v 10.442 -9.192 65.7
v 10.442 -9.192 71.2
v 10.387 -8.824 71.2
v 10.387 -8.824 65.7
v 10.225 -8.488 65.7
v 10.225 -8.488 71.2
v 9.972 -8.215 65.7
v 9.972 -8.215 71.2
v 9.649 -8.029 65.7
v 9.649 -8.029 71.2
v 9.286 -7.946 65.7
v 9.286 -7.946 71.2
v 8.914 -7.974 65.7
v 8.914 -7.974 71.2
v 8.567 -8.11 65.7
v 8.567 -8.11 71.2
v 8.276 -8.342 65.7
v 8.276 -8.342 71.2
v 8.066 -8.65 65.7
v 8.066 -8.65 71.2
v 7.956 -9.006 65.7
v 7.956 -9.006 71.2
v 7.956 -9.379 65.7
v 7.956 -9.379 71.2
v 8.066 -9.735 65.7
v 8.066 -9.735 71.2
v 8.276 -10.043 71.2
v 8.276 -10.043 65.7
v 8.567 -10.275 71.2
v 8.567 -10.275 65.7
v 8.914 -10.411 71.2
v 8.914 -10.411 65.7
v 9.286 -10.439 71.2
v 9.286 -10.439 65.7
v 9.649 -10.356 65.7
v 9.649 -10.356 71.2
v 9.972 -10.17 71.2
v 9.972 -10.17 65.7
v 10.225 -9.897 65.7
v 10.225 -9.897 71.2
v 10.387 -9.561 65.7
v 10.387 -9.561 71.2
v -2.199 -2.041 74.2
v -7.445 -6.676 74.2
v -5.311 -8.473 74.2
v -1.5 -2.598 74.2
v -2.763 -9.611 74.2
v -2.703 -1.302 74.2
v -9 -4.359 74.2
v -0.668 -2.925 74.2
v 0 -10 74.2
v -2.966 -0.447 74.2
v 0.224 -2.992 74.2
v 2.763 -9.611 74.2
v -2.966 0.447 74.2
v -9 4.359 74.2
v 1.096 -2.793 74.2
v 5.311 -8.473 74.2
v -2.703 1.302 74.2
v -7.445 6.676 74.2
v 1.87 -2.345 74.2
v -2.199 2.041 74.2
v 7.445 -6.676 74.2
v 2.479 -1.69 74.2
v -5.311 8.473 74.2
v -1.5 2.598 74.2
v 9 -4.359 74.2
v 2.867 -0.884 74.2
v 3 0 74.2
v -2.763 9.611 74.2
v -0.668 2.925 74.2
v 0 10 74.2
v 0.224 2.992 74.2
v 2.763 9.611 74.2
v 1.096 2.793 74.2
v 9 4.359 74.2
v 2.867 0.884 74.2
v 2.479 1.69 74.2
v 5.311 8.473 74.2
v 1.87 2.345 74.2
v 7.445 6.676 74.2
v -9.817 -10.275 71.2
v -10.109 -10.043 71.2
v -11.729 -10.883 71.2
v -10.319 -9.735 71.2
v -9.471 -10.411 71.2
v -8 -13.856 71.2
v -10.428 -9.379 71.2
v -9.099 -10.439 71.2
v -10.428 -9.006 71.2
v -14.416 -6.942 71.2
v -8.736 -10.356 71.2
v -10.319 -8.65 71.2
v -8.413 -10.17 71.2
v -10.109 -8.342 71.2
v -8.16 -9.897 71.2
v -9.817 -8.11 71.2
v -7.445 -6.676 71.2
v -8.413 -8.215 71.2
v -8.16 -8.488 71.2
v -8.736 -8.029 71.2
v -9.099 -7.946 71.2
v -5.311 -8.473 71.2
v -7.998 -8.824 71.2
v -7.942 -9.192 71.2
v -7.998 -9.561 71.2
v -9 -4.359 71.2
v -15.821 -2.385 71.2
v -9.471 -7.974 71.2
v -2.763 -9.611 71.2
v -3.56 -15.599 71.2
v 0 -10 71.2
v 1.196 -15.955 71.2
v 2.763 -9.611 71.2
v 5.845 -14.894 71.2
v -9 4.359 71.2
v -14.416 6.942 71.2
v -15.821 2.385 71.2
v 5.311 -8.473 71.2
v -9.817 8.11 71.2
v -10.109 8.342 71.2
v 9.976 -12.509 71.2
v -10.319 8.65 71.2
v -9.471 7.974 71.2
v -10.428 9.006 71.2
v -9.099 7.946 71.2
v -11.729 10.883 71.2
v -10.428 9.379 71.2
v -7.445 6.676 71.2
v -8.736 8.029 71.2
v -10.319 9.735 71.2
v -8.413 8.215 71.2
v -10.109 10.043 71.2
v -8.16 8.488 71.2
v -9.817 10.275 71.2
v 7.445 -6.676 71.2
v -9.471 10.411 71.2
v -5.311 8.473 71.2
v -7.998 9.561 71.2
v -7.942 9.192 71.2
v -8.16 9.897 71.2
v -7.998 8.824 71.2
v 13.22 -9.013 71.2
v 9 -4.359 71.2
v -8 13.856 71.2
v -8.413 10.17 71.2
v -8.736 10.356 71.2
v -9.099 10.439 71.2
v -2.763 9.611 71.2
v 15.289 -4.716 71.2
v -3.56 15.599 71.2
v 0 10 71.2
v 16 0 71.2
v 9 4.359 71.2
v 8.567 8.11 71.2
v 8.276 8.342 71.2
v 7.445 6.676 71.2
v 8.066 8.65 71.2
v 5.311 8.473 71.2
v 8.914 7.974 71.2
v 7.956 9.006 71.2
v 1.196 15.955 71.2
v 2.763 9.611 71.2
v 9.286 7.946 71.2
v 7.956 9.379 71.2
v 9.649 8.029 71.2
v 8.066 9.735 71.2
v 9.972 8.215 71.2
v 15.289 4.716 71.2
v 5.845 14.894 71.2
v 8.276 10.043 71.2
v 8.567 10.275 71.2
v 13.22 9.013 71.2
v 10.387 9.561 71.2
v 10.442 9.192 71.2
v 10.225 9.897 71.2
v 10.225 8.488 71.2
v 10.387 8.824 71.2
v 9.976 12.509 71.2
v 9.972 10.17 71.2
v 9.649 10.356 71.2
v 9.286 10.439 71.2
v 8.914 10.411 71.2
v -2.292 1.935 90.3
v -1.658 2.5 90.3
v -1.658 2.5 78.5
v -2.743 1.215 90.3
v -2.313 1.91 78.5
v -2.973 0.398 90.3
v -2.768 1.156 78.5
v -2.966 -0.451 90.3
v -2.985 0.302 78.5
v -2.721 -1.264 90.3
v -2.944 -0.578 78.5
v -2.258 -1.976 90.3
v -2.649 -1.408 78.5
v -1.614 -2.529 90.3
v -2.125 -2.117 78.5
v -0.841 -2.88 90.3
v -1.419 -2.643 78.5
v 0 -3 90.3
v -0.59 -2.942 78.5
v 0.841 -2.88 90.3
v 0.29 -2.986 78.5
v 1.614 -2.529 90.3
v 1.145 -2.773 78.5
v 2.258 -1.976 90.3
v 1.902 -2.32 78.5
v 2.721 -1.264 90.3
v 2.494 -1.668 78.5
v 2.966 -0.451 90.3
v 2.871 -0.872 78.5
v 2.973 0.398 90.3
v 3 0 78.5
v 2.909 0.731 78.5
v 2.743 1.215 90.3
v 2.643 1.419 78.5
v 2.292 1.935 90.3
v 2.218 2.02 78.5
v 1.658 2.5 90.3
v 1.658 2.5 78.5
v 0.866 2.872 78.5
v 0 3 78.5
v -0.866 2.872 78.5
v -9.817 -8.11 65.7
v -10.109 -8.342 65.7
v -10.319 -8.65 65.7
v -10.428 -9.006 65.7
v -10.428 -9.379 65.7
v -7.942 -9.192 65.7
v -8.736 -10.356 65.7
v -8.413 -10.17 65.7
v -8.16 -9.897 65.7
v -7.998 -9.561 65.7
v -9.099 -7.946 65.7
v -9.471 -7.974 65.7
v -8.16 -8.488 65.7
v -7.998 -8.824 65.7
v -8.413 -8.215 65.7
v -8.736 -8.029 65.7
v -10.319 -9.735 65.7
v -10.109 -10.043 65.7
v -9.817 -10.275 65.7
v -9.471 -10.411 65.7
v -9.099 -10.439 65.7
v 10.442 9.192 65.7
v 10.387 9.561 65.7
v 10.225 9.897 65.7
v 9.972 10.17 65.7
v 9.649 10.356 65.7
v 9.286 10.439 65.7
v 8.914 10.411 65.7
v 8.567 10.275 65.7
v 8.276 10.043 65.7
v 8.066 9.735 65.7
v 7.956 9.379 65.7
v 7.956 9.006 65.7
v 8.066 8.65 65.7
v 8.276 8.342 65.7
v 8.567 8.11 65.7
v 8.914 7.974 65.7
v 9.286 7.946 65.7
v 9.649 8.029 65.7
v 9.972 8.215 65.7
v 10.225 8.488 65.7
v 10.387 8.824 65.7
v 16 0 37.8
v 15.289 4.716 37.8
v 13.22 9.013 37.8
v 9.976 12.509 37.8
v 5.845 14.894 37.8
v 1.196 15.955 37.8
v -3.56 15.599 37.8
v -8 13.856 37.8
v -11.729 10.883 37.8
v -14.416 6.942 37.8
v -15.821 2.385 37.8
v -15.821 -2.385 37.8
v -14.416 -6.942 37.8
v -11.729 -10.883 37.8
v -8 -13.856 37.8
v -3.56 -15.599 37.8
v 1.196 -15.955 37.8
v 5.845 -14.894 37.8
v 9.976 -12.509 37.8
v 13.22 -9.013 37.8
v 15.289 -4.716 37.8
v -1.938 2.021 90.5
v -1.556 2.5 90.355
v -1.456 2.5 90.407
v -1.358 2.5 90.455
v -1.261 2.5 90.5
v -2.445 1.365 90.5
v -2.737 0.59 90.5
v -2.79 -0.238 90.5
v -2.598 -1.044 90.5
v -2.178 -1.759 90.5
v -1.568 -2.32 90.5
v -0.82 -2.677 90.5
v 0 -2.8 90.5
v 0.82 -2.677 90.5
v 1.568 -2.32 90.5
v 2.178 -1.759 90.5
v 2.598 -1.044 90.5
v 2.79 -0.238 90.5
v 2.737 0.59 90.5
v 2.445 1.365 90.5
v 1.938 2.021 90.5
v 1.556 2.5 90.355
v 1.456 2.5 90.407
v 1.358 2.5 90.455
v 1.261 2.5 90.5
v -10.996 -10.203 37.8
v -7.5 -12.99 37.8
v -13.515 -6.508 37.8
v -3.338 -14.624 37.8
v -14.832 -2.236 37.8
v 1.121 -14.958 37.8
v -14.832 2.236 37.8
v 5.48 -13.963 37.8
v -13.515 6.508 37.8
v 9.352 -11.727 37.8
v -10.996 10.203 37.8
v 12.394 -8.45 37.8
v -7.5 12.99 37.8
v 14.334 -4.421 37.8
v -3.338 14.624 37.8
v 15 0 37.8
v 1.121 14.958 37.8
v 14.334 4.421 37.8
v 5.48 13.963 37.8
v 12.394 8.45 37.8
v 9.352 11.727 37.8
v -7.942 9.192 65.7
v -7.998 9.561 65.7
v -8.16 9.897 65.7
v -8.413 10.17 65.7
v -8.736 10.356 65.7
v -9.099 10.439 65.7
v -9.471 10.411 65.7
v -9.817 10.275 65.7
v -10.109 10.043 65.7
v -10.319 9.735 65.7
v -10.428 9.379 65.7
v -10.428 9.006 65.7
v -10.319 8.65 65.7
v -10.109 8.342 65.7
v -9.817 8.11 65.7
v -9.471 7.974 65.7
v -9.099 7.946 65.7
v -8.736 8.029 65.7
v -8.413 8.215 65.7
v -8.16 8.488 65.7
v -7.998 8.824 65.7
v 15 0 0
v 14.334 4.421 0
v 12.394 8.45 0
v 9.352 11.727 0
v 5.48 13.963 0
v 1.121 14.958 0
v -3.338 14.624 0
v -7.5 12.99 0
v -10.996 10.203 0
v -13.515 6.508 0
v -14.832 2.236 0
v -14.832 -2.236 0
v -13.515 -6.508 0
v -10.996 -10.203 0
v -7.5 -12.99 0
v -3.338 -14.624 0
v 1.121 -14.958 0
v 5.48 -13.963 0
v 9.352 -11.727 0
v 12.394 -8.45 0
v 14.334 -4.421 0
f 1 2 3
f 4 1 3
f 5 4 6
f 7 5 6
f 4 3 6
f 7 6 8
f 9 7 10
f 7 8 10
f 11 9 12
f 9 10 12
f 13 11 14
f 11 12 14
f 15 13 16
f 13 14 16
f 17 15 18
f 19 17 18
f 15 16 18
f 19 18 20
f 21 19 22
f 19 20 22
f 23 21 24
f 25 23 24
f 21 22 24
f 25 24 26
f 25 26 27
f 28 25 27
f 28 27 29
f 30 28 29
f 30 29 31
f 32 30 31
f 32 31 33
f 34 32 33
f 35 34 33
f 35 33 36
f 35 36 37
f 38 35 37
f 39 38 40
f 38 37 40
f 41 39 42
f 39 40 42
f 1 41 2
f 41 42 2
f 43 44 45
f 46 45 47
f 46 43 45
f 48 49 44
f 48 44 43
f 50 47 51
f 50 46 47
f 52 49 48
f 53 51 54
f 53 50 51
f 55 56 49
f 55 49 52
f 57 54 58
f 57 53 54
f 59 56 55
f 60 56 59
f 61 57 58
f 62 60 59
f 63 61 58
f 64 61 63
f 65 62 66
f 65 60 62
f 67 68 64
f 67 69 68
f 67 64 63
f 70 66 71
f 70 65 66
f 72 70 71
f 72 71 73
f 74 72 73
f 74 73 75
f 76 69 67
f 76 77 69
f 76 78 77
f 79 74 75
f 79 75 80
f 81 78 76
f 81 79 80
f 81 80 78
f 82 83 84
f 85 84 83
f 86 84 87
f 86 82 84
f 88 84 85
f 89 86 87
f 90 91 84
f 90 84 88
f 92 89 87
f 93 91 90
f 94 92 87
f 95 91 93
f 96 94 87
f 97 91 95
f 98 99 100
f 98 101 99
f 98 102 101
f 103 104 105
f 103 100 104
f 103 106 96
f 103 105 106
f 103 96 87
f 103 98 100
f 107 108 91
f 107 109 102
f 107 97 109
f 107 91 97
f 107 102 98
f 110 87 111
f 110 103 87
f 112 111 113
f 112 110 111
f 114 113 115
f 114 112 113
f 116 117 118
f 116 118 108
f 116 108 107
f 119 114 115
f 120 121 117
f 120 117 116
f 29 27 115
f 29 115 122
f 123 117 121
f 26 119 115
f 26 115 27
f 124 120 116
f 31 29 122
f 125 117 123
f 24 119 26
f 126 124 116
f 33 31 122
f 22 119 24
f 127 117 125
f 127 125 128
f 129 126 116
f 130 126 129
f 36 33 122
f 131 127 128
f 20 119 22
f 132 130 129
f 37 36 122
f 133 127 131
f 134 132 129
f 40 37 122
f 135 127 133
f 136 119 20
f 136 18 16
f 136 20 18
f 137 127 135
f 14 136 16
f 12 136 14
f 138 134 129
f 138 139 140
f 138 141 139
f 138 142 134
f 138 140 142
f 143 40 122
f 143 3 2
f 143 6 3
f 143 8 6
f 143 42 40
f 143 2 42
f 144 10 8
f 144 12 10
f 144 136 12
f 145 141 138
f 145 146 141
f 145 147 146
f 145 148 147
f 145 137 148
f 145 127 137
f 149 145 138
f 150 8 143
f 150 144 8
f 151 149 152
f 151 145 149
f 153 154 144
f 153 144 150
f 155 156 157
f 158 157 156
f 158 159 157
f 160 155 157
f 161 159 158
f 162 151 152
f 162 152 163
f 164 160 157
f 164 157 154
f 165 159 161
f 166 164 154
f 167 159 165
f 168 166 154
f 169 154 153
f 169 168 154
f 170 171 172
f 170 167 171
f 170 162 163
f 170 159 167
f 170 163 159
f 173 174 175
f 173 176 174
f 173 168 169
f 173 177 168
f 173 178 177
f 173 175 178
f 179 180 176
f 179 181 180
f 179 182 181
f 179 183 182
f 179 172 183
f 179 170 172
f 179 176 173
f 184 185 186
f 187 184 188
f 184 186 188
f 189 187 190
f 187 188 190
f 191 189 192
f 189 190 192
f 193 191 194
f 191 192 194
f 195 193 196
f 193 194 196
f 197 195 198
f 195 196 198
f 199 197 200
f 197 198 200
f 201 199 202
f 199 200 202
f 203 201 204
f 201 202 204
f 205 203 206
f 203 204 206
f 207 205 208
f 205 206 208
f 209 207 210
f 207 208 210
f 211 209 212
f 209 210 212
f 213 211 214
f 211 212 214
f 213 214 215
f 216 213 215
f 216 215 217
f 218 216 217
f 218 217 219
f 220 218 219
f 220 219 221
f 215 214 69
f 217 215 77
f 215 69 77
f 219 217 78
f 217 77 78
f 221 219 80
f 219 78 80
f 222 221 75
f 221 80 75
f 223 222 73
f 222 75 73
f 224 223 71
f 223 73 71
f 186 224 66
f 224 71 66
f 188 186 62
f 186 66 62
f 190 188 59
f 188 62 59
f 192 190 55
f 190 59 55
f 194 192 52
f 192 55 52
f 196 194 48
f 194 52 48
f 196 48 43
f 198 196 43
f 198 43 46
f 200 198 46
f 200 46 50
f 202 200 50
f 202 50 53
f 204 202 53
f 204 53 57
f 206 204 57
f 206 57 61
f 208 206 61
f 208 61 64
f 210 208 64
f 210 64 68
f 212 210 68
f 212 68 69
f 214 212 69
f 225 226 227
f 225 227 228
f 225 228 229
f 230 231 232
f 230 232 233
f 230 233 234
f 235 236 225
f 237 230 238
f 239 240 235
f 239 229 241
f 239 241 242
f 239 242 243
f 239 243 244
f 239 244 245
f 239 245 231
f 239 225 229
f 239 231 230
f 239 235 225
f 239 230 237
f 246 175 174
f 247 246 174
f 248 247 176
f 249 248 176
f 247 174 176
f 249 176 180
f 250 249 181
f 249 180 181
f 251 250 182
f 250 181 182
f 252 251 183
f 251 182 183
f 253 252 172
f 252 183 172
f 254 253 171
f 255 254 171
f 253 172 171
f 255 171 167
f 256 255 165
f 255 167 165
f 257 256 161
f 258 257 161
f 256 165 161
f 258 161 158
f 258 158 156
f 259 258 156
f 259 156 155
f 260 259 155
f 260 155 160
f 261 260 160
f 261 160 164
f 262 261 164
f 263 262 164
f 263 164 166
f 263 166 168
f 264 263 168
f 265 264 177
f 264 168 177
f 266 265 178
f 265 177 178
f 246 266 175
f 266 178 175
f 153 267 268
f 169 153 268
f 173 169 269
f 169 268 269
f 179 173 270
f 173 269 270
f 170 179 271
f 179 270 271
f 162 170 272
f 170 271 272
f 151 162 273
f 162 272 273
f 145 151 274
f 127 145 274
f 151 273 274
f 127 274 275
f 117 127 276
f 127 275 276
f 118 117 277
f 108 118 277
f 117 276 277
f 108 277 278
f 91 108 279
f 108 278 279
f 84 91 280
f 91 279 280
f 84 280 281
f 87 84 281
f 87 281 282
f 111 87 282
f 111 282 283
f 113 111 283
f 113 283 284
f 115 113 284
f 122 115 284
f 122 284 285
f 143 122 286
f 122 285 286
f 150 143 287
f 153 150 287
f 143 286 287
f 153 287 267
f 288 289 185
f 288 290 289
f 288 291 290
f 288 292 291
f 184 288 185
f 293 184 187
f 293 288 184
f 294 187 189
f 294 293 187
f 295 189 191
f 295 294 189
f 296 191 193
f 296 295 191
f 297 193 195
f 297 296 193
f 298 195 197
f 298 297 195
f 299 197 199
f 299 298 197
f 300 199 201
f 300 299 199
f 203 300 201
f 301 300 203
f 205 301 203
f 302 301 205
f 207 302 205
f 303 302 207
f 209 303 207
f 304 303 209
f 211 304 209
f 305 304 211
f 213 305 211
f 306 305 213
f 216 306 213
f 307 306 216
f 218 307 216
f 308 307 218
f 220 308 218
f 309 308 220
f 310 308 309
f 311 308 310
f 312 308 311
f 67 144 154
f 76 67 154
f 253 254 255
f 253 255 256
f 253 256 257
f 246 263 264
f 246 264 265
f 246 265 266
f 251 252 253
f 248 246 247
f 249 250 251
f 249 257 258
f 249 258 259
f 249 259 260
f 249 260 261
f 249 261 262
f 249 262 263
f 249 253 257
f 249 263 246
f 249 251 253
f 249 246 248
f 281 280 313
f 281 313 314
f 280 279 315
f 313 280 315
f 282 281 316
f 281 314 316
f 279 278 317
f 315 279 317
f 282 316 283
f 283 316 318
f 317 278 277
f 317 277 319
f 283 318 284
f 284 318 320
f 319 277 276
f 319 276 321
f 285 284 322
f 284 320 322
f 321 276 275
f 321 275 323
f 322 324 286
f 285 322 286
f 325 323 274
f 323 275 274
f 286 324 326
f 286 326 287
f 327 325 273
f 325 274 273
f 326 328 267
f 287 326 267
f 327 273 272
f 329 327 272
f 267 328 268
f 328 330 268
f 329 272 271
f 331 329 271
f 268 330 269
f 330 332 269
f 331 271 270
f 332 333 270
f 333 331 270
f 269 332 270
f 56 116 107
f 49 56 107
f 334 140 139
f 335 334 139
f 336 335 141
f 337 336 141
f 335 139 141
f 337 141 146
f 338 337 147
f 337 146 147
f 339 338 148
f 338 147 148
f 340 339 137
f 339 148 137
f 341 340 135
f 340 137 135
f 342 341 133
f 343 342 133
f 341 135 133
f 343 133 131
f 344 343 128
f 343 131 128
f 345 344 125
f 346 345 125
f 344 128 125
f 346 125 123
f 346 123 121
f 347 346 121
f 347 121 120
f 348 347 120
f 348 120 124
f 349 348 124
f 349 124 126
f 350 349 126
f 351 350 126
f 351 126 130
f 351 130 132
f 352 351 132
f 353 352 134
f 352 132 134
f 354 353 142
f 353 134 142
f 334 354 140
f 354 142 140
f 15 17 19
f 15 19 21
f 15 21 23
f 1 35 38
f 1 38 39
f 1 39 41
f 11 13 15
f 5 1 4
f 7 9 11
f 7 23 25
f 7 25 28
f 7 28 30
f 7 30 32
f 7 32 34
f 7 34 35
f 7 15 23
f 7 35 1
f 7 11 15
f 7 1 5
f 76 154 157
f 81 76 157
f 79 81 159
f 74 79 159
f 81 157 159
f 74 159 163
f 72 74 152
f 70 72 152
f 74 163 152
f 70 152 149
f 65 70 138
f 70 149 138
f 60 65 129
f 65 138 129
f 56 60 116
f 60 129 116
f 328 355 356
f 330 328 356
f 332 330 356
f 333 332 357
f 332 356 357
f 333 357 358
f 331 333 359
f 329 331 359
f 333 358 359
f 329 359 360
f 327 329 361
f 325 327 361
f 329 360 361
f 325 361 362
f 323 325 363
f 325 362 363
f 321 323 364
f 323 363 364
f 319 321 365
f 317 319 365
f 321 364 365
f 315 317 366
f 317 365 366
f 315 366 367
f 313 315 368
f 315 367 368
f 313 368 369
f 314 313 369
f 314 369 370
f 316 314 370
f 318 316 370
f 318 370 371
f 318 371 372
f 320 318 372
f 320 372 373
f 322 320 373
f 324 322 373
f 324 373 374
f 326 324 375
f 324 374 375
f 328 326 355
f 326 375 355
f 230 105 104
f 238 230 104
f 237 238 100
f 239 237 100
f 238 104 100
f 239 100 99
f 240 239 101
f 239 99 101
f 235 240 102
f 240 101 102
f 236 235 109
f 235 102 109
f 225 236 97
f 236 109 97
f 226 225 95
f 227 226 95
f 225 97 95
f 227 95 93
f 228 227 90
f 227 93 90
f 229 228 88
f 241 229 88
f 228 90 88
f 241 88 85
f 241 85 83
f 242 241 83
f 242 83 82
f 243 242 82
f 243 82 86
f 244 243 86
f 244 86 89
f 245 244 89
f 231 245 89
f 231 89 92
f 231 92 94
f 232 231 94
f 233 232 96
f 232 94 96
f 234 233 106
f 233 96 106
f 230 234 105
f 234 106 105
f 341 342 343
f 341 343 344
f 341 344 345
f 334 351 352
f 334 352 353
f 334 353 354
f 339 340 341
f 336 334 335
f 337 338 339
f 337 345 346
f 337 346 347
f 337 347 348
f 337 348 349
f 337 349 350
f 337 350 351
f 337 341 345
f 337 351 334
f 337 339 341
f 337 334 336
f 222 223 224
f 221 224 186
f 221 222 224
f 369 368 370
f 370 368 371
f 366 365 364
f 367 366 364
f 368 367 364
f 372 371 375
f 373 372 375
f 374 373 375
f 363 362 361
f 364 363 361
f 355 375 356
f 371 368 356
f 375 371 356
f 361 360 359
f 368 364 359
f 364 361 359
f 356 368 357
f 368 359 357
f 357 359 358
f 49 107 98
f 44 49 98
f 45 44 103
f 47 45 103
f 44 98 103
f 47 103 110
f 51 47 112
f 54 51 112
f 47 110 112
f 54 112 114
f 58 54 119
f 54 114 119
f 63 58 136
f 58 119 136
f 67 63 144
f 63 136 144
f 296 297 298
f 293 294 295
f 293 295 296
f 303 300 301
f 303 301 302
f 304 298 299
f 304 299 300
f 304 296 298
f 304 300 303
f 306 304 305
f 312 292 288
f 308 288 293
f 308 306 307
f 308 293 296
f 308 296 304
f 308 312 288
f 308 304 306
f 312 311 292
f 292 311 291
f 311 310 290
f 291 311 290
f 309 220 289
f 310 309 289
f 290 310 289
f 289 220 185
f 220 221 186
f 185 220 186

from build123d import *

# Parameters (mm, degrees)
F0_R      = 15
F1_DEPTH  = 37.8
F2_R      = 16
F3_DEPTH  = 33.4
F5_DEPTH  = 3
F6_R      = 3
F7_DEPTH  = 4.3
F9_DEPTH  = 12
F10_SIZE  = 0.2
F11_R     = 1.25
F12_DEPTH = 5.5


with BuildPart() as f1:
    # F0 (on Top) → F1 (new body)
    with BuildSketch(Plane.XY):
        Circle(F0_R)
    extrude(amount=F1_DEPTH)

    # F2 (on face) → F3 (join)
    with BuildSketch(Plane.XY.offset(37.8)):
        Circle(F2_R)
    extrude(amount=F3_DEPTH)

    # F4 (on face) → F5 (join)
    with BuildSketch(Plane.XY.offset(71.2)):
        with BuildLine():
            Line((-9, 4.3588989435), (-9, -4.3588989435))
            ThreePointArc((-9, -4.3588989435), (0, -10), (9, -4.3588989435))
            Line((9, -4.3588989435), (9, 4.3588989435))
            ThreePointArc((9, 4.3588989435), (0, 10), (-9, 4.3588989435))
        make_face()
    extrude(amount=F5_DEPTH)

    # F6 (on face) → F7 (join)
    with BuildSketch(Plane.XY.offset(74.2)):
        Circle(F6_R)
    extrude(amount=F7_DEPTH)

    # F8 (on face) → F9 (join)
    with BuildSketch(Plane.XY.offset(78.5)):
        with BuildLine():
            Line((1.6583123952, 2.5), (-1.6583123952, 2.5))
            ThreePointArc((-1.6583123952, 2.5), (0, -3), (1.6583123952, 2.5))
        make_face()
    extrude(amount=F9_DEPTH)

    # F10
    f10_edges = [f1.edges().sort_by_distance(p)[0] for p in [
        (0, -3, 90.5),
    ]]
    chamfer(f10_edges, length=F10_SIZE)

    # F11 (on face) → F12 (cut)
    with BuildSketch(Plane.XY.offset(71.2)):
        with Locations((9.1923881554, -9.1923881554)):
            Circle(F11_R)
        with Locations((-9.1923881554, -9.1923881554)):
            Circle(F11_R)
        with Locations((9.1923881554, 9.1923881554)):
            Circle(F11_R)
        with Locations((-9.1923881554, 9.1923881554)):
            Circle(F11_R)
    extrude(amount=-F12_DEPTH, mode=Mode.SUBTRACT)


solid = f1.part
